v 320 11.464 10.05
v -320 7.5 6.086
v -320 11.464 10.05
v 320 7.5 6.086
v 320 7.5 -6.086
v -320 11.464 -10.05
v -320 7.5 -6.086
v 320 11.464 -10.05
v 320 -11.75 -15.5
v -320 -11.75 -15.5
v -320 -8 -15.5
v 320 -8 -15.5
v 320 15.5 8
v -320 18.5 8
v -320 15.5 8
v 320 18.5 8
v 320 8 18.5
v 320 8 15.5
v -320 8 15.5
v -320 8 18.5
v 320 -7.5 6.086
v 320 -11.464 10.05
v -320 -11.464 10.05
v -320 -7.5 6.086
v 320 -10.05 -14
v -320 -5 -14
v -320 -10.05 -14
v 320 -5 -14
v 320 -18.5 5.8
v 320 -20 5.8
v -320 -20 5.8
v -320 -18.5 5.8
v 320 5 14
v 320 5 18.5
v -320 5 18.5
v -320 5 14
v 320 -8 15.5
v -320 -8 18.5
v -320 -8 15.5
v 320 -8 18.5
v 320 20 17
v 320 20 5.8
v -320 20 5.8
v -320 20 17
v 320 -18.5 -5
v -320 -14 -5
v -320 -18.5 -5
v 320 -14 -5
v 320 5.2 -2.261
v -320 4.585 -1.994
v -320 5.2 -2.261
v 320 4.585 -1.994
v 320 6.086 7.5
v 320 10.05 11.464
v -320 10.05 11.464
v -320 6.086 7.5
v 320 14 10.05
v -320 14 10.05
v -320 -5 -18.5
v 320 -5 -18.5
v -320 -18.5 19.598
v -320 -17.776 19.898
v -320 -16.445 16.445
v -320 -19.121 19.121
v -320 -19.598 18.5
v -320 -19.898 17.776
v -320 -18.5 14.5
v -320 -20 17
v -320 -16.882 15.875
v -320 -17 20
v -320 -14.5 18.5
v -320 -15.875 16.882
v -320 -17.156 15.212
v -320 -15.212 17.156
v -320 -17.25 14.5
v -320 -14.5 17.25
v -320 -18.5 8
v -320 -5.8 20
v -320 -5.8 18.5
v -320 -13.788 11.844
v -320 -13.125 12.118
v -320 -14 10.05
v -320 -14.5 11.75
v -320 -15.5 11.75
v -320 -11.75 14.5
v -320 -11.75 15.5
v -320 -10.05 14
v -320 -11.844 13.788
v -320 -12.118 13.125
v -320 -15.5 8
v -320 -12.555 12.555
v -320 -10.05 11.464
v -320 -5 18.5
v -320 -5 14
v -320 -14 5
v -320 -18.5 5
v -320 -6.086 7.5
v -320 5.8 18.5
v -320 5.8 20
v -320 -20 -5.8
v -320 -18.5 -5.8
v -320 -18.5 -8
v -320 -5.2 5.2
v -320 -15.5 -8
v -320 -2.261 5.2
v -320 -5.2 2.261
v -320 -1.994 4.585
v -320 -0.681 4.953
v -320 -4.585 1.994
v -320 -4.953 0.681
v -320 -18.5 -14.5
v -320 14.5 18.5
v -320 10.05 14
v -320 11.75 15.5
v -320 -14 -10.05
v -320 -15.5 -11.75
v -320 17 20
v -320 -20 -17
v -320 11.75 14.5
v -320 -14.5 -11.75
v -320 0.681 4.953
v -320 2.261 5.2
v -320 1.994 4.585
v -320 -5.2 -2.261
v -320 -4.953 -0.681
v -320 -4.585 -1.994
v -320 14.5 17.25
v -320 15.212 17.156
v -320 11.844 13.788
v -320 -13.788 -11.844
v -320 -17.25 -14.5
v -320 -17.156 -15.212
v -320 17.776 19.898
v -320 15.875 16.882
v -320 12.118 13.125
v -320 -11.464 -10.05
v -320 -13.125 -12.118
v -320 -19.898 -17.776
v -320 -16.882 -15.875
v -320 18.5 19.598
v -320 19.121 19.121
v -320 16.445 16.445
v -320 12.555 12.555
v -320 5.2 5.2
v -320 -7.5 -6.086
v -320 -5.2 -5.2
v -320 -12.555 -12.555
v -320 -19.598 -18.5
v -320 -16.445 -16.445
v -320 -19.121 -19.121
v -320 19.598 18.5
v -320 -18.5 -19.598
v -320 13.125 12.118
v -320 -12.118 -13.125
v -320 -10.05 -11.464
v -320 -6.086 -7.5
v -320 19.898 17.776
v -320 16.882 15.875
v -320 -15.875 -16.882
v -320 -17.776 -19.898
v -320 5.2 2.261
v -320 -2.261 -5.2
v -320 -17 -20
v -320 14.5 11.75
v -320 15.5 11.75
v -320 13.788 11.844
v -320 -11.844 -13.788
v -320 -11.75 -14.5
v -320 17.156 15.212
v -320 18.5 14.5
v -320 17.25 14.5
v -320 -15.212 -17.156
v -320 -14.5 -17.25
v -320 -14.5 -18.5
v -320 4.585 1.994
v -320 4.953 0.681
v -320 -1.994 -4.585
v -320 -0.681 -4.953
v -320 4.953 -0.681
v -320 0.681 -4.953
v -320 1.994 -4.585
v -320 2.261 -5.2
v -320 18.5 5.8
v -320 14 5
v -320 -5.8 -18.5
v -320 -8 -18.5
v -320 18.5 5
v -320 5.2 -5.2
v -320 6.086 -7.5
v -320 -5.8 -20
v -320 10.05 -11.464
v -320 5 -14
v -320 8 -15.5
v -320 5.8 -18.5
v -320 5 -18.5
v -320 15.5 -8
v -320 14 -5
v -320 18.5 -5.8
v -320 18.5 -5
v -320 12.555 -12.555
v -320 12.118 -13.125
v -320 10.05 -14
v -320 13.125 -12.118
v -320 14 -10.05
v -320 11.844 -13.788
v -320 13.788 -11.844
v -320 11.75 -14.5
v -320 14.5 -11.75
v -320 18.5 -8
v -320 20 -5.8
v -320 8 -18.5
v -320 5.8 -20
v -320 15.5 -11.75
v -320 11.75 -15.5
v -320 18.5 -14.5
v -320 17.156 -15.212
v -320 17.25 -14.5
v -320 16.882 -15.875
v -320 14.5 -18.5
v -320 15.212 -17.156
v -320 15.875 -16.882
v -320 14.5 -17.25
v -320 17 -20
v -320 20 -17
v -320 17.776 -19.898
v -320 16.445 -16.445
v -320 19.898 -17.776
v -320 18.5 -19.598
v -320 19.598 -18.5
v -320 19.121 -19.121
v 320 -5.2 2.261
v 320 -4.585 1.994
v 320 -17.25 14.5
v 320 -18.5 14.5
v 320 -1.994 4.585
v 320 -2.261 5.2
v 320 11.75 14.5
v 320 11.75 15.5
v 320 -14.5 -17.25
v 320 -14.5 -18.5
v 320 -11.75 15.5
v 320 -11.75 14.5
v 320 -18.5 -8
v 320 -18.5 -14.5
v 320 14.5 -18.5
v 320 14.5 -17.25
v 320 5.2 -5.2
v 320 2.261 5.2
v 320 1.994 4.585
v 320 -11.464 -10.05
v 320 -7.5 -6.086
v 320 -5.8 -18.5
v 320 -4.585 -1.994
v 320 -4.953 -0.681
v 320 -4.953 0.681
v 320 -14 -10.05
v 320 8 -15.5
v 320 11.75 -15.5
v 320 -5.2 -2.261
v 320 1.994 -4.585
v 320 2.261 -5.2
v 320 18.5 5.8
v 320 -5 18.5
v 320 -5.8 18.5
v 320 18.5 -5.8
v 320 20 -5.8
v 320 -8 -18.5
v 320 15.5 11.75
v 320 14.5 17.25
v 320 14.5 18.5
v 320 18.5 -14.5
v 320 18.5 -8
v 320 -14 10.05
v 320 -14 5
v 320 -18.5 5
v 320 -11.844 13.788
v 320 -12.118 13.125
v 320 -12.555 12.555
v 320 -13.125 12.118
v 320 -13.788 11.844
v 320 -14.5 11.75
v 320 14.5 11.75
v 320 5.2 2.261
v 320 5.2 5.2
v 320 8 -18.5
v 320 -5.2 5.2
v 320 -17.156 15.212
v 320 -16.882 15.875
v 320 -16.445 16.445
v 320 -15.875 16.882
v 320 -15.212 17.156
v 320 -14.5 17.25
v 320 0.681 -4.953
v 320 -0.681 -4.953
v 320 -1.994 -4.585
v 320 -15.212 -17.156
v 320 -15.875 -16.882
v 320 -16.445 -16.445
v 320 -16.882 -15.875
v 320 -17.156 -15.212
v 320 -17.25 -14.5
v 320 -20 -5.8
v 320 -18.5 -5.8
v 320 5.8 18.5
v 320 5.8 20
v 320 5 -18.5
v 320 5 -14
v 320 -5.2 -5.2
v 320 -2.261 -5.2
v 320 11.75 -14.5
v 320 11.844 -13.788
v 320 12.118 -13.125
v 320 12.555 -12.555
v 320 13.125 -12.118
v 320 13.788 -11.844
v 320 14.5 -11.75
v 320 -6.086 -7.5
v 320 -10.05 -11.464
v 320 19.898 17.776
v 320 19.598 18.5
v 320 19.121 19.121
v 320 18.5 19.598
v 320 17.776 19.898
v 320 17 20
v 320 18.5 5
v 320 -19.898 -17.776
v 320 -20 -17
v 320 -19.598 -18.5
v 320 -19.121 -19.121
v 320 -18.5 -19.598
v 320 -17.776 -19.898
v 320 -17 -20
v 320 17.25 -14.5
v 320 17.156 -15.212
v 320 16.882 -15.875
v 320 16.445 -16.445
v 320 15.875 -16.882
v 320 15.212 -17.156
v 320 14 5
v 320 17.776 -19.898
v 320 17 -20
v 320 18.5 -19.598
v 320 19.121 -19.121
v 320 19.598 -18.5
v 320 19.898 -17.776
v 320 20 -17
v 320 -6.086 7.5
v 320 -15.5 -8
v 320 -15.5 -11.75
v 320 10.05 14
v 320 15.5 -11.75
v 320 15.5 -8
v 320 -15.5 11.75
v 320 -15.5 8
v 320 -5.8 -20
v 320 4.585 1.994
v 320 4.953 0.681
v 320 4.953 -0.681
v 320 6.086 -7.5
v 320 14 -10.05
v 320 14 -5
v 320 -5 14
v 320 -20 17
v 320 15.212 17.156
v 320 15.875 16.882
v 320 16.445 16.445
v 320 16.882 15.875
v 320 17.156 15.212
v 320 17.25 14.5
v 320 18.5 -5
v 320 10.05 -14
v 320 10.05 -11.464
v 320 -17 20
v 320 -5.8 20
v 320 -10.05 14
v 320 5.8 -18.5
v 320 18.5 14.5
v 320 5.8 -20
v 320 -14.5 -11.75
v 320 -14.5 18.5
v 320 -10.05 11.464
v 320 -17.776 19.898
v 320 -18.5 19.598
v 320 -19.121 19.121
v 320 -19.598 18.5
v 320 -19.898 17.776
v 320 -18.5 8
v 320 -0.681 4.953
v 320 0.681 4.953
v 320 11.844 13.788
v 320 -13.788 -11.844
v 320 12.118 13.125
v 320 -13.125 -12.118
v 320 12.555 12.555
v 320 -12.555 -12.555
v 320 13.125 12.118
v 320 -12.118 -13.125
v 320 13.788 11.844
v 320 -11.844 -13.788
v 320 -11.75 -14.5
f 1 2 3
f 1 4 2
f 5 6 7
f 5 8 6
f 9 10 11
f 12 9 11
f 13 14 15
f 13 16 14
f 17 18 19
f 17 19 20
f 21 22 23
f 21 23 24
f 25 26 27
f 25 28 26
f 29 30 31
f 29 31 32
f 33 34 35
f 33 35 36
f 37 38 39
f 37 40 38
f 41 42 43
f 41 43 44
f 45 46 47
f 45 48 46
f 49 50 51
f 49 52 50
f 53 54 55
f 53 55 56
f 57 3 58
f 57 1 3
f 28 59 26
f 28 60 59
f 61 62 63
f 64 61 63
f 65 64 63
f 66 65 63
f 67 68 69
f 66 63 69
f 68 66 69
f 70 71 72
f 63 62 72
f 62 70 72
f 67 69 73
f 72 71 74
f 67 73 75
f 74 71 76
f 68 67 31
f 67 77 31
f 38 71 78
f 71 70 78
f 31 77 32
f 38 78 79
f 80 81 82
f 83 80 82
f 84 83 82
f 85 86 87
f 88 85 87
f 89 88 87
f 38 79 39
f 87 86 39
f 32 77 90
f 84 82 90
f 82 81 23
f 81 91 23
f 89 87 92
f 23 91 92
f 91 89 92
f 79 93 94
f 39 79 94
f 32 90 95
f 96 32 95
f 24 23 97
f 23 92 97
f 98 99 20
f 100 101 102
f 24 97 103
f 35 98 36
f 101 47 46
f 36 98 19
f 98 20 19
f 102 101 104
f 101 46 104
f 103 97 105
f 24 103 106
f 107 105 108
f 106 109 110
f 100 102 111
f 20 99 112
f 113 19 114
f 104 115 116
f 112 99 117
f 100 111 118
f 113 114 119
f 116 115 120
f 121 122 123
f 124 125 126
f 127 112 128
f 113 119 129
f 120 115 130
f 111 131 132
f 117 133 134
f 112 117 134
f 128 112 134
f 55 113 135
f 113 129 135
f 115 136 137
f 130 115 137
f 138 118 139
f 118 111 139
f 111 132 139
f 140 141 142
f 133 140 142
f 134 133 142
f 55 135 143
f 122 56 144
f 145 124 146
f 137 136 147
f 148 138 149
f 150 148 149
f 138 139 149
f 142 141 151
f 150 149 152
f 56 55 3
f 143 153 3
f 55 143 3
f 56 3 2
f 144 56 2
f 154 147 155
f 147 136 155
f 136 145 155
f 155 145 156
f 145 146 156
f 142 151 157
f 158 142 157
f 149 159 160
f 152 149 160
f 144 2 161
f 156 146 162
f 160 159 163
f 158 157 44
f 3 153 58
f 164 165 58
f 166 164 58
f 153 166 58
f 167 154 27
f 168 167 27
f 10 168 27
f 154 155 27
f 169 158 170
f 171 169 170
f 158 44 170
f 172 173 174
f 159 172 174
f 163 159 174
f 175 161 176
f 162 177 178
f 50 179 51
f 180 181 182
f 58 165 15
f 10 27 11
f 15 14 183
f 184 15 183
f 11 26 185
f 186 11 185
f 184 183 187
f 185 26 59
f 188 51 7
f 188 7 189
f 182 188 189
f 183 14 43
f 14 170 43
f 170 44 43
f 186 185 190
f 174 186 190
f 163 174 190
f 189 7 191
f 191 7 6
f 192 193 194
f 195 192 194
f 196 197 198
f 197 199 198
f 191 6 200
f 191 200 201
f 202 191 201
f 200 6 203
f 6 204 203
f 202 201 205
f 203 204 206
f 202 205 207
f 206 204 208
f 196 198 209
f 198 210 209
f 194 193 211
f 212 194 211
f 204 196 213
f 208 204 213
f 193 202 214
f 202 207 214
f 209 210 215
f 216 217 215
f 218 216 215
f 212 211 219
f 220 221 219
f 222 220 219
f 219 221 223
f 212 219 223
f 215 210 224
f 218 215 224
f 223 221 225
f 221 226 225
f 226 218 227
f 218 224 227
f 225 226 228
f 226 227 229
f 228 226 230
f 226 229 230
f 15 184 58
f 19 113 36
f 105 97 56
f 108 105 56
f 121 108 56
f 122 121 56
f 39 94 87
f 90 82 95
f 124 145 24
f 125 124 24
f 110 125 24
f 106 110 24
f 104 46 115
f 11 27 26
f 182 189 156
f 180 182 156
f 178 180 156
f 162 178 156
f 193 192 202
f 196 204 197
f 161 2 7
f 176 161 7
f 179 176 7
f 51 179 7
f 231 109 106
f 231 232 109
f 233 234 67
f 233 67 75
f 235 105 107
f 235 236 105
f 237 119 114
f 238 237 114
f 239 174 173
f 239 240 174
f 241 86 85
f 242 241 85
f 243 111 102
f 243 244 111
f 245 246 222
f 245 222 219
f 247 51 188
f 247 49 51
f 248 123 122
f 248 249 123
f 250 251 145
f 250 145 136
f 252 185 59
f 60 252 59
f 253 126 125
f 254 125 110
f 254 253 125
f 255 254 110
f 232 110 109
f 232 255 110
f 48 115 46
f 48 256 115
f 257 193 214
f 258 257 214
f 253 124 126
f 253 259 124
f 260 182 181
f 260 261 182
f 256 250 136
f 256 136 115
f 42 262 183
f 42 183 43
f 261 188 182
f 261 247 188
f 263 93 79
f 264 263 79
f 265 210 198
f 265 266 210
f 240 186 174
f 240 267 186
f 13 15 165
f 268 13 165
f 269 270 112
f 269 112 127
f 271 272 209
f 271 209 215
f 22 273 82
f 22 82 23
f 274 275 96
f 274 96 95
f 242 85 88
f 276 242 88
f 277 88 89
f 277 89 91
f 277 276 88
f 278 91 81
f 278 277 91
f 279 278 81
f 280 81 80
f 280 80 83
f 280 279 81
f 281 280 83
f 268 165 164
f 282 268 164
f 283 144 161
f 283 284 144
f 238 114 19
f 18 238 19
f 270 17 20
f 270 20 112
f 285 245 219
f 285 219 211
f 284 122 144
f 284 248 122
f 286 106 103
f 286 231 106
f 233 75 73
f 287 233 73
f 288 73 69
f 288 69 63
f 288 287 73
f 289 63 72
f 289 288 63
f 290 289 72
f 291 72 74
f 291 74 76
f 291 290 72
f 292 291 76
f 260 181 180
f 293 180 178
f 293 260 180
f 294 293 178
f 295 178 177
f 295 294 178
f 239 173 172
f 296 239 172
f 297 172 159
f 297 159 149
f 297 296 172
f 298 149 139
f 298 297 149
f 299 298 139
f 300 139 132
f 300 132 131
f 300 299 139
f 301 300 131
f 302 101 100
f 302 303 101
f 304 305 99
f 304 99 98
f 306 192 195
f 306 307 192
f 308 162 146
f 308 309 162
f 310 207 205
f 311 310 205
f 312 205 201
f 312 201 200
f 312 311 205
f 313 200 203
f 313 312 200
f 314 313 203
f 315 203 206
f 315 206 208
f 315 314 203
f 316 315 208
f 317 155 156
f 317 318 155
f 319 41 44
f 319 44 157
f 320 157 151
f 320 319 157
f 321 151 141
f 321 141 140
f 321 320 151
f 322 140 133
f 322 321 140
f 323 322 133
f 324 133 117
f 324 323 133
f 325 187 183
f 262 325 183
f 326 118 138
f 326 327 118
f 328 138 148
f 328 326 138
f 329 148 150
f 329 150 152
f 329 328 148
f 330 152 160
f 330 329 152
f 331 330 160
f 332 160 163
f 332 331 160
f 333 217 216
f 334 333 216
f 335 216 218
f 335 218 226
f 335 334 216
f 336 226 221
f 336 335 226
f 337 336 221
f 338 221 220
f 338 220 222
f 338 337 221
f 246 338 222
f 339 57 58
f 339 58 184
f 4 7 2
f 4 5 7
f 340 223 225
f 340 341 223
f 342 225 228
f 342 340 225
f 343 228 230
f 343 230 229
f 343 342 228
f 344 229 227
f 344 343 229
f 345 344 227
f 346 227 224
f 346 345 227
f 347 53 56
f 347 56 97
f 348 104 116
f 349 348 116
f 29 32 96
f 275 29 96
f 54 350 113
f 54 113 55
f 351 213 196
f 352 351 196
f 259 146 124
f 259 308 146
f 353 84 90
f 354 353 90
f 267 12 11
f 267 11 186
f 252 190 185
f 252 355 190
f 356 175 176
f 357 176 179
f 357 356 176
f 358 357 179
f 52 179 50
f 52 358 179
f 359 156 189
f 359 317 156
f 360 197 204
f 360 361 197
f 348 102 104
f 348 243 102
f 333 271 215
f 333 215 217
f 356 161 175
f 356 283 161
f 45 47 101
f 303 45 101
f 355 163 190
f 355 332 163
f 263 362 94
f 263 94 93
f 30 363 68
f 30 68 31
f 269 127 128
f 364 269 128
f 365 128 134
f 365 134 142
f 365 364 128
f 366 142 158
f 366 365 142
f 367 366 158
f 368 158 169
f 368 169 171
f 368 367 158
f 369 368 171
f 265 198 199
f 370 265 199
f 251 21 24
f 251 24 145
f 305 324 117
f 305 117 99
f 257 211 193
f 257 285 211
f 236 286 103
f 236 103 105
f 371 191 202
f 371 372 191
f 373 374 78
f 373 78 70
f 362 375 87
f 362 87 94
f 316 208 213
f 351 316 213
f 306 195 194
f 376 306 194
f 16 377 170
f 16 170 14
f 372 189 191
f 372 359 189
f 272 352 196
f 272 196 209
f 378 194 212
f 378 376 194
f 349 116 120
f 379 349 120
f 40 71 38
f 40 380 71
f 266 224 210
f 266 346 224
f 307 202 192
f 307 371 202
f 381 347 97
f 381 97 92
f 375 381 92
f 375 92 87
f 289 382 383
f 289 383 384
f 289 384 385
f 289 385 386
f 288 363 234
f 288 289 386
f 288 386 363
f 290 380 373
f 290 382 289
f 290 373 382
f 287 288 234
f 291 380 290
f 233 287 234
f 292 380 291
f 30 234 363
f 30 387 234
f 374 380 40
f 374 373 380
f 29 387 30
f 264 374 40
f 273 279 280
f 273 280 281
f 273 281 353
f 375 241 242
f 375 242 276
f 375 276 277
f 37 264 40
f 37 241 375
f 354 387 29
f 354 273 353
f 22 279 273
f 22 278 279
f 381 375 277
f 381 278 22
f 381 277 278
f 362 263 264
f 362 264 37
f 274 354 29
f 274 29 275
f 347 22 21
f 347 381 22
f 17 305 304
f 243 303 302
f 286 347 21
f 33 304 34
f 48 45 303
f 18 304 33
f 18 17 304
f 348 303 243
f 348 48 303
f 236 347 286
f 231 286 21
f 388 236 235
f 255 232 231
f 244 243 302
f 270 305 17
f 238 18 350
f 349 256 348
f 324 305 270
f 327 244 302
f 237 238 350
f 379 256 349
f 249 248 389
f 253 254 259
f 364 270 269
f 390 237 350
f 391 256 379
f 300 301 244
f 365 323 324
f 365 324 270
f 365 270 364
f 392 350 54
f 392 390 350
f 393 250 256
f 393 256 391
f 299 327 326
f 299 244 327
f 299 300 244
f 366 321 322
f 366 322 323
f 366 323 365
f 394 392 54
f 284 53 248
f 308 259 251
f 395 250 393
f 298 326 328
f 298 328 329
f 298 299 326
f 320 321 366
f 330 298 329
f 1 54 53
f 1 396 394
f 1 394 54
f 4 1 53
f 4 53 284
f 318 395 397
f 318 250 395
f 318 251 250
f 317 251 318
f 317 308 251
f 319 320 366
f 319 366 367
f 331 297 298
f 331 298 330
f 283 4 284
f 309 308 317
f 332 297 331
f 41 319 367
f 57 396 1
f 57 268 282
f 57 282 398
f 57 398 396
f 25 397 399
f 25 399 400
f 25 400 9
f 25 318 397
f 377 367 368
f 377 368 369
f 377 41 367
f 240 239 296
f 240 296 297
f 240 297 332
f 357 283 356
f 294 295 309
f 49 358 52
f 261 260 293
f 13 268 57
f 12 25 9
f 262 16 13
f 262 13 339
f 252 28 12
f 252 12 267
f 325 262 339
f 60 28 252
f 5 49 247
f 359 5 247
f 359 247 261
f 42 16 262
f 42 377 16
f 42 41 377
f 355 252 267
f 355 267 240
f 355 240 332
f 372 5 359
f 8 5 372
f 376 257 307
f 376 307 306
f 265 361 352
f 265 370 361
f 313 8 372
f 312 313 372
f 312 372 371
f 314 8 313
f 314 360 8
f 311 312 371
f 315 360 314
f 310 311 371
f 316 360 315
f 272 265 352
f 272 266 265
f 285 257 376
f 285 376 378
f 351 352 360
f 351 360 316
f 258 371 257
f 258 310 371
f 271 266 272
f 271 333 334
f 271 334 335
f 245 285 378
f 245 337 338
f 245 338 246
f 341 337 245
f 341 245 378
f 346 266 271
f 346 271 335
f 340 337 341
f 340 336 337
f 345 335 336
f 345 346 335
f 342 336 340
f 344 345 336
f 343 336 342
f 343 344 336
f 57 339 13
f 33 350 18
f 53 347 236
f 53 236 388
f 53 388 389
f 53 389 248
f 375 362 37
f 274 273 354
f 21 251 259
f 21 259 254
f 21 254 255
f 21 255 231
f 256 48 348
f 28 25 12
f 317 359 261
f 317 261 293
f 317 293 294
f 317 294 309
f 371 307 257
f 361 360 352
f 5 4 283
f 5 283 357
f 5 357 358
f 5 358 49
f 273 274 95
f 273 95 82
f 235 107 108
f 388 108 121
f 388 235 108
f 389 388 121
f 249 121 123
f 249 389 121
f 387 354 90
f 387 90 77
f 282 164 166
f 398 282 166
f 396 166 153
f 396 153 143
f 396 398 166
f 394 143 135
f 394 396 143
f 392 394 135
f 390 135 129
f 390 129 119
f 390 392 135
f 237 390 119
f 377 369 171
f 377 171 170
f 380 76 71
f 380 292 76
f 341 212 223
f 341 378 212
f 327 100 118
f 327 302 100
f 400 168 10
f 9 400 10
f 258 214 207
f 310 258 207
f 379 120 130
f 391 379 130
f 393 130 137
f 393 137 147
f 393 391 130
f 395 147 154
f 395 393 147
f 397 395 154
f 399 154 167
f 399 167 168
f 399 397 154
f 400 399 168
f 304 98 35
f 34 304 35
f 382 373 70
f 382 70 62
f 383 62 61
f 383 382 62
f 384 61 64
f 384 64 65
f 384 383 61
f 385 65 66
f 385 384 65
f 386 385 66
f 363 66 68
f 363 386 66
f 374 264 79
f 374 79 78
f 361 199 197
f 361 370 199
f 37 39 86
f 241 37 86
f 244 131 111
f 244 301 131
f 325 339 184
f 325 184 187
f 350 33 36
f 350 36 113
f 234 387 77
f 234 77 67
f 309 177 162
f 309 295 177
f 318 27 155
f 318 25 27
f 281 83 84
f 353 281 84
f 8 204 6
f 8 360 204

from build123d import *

# Parameters (mm, degrees)
BR_EXTRUDE_DEPTH      = 320
BR_EXTRUDE_DEPTH_BACK = 320


with BuildPart() as part:
    # Sketch2 → BR_Extrude (new body, two sides)
    with BuildSketch(Plane(origin=(0, 0, 0), x_dir=(0, 0, -1), z_dir=(1, 0, 0))) as br_extrude_sk:
        with BuildLine():
            Line((-10.05, 11.464213562), (-10.05, 14))
            Line((-10.05, 14), (-5, 14))
            Line((-5, 14), (-5, 18.5))
            Line((-5, 18.5), (-5.8, 18.5))
            Line((-5.8, 18.5), (-5.8, 20))
            Line((-5.8, 20), (-17, 20))
            ThreePointArc((-17, 20), (-19.121320344, 19.121320344), (-20, 17))
            Line((-20, 17), (-20, 5.8))
            Line((-20, 5.8), (-18.5, 5.8))
            Line((-18.5, 5.8), (-18.5, 5))
            Line((-18.5, 5), (-14, 5))
            Line((-14, 5), (-14, 10.05))
            Line((-14, 10.05), (-11.464213562, 10.05))
            Line((-11.464213562, 10.05), (-7.5, 6.085786438))
            Line((-7.5, 6.085786438), (-7.5, -6.085786438))
            Line((-7.5, -6.085786438), (-11.464213562, -10.05))
            Line((-11.464213562, -10.05), (-14, -10.05))
            Line((-14, -10.05), (-14, -5))
            Line((-14, -5), (-18.5, -5))
            Line((-18.5, -5), (-18.5, -5.8))
            Line((-18.5, -5.8), (-20, -5.8))
            Line((-20, -5.8), (-20, -17))
            ThreePointArc((-20, -17), (-19.121320344, -19.121320344), (-17, -20))
            Line((-17, -20), (-5.8, -20))
            Line((-5.8, -20), (-5.8, -18.5))
            Line((-5.8, -18.5), (-5, -18.5))
            Line((-5, -18.5), (-5, -14))
            Line((-5, -14), (-10.05, -14))
            Line((-10.05, -14), (-10.05, -11.464213562))
            Line((-10.05, -11.464213562), (-6.085786438, -7.5))
            Line((-6.085786438, -7.5), (6.085786438, -7.5))
            Line((6.085786438, -7.5), (10.05, -11.464213562))
            Line((10.05, -11.464213562), (10.05, -14))
            Line((10.05, -14), (5, -14))
            Line((5, -14), (5, -18.5))
            Line((5, -18.5), (5.8, -18.5))
            Line((5.8, -18.5), (5.8, -20))
            Line((5.8, -20), (17, -20))
            ThreePointArc((17, -20), (19.121320344, -19.121320344), (20, -17))
            Line((20, -17), (20, -5.8))
            Line((20, -5.8), (18.5, -5.8))
            Line((18.5, -5.8), (18.5, -5))
            Line((18.5, -5), (14, -5))
            Line((14, -5), (14, -10.05))
            Line((14, -10.05), (11.464213562, -10.05))
            Line((11.464213562, -10.05), (7.5, -6.085786438))
            Line((7.5, -6.085786438), (7.5, 6.085786438))
            Line((7.5, 6.085786438), (11.464213562, 10.05))
            Line((11.464213562, 10.05), (14, 10.05))
            Line((14, 10.05), (14, 5))
            Line((14, 5), (18.5, 5))
            Line((18.5, 5), (18.5, 5.8))
            Line((18.5, 5.8), (20, 5.8))
            Line((20, 5.8), (20, 17))
            ThreePointArc((20, 17), (19.121320344, 19.121320344), (17, 20))
            Line((17, 20), (5.8, 20))
            Line((5.8, 20), (5.8, 18.5))
            Line((5.8, 18.5), (5, 18.5))
            Line((5, 18.5), (5, 14))
            Line((5, 14), (10.05, 14))
            Line((10.05, 14), (10.05, 11.464213562))
            Line((10.05, 11.464213562), (6.085786438, 7.5))
            Line((6.085786438, 7.5), (-6.085786438, 7.5))
            Line((-6.085786438, 7.5), (-10.05, 11.464213562))
        make_face()
        with BuildLine():
            Line((8, 15.5), (8, 18.5))
            Line((8, 18.5), (14.5, 18.5))
            Line((14.5, 18.5), (14.5, 17.25))
            ThreePointArc((14.5, 17.25), (16.444543648, 16.444543648), (17.25, 14.5))
            Line((17.25, 14.5), (18.5, 14.5))
            Line((18.5, 14.5), (18.5, 8))
            Line((18.5, 8), (15.5, 8))
            Line((15.5, 8), (15.5, 11.75))
            Line((15.5, 11.75), (14.5, 11.75))
            ThreePointArc((14.5, 11.75), (12.555456352, 12.555456352), (11.75, 14.5))
            Line((11.75, 14.5), (11.75, 15.5))
            Line((11.75, 15.5), (8, 15.5))
        make_face(mode=Mode.SUBTRACT)
        with BuildLine():
            Line((8, -15.5), (11.75, -15.5))
            Line((11.75, -15.5), (11.75, -14.5))
            ThreePointArc((11.75, -14.5), (12.555456352, -12.555456352), (14.5, -11.75))
            Line((14.5, -11.75), (15.5, -11.75))
            Line((15.5, -11.75), (15.5, -8))
            Line((15.5, -8), (18.5, -8))
            Line((18.5, -8), (18.5, -14.5))
            Line((18.5, -14.5), (17.25, -14.5))
            ThreePointArc((17.25, -14.5), (16.444543648, -16.444543648), (14.5, -17.25))
            Line((14.5, -17.25), (14.5, -18.5))
            Line((14.5, -18.5), (8, -18.5))
            Line((8, -18.5), (8, -15.5))
        make_face(mode=Mode.SUBTRACT)
        with BuildLine():
            Line((-15.5, 8), (-18.5, 8))
            Line((-18.5, 8), (-18.5, 14.5))
            Line((-18.5, 14.5), (-17.25, 14.5))
            ThreePointArc((-17.25, 14.5), (-16.444543648, 16.444543648), (-14.5, 17.25))
            Line((-14.5, 17.25), (-14.5, 18.5))
            Line((-14.5, 18.5), (-8, 18.5))
            Line((-8, 18.5), (-8, 15.5))
            Line((-8, 15.5), (-11.75, 15.5))
            Line((-11.75, 15.5), (-11.75, 14.5))
            ThreePointArc((-11.75, 14.5), (-12.555456352, 12.555456352), (-14.5, 11.75))
            Line((-14.5, 11.75), (-15.5, 11.75))
            Line((-15.5, 11.75), (-15.5, 8))
        make_face(mode=Mode.SUBTRACT)
        with BuildLine():
            Line((-11.75, -14.5), (-11.75, -15.5))
            Line((-11.75, -15.5), (-8, -15.5))
            Line((-8, -15.5), (-8, -18.5))
            Line((-8, -18.5), (-14.5, -18.5))
            Line((-14.5, -18.5), (-14.5, -17.25))
            ThreePointArc((-14.5, -17.25), (-16.444543648, -16.444543648), (-17.25, -14.5))
            Line((-17.25, -14.5), (-18.5, -14.5))
            Line((-18.5, -14.5), (-18.5, -8))
            Line((-18.5, -8), (-15.5, -8))
            Line((-15.5, -8), (-15.5, -11.75))
            Line((-15.5, -11.75), (-14.5, -11.75))
            ThreePointArc((-14.5, -11.75), (-12.555456352, -12.555456352), (-11.75, -14.5))
        make_face(mode=Mode.SUBTRACT)
        with BuildLine():
            Line((-5.2, -5.2), (-5.2, -2.26102435))
            Line((-5.2, -2.26102435), (-4.585300372, -1.993745345))
            ThreePointArc((-4.585300372, -1.993745345), (-5, 0), (-4.585300372, 1.993745345))
            Line((-4.585300372, 1.993745345), (-5.2, 2.26102435))
            Line((-5.2, 2.26102435), (-5.2, 5.2))
            Line((-5.2, 5.2), (-2.26102435, 5.2))
            Line((-2.26102435, 5.2), (-1.993745345, 4.585300372))
            ThreePointArc((-1.993745345, 4.585300372), (0, 5), (1.993745345, 4.585300372))
            Line((1.993745345, 4.585300372), (2.26102435, 5.2))
            Line((2.26102435, 5.2), (5.2, 5.2))
            Line((5.2, 5.2), (5.2, 2.26102435))
            Line((5.2, 2.26102435), (4.585300372, 1.993745345))
            ThreePointArc((4.585300372, 1.993745345), (5, 0), (4.585300372, -1.993745345))
            Line((4.585300372, -1.993745345), (5.2, -2.26102435))
            Line((5.2, -2.26102435), (5.2, -5.2))
            Line((5.2, -5.2), (2.26102435, -5.2))
            Line((2.26102435, -5.2), (1.993745345, -4.585300372))
            ThreePointArc((1.993745345, -4.585300372), (0, -5), (-1.993745345, -4.585300372))
            Line((-1.993745345, -4.585300372), (-2.26102435, -5.2))
            Line((-2.26102435, -5.2), (-5.2, -5.2))
        make_face(mode=Mode.SUBTRACT)
    extrude(amount=BR_EXTRUDE_DEPTH)
    extrude(br_extrude_sk.sketch, amount=-BR_EXTRUDE_DEPTH_BACK)


solid = part.part
